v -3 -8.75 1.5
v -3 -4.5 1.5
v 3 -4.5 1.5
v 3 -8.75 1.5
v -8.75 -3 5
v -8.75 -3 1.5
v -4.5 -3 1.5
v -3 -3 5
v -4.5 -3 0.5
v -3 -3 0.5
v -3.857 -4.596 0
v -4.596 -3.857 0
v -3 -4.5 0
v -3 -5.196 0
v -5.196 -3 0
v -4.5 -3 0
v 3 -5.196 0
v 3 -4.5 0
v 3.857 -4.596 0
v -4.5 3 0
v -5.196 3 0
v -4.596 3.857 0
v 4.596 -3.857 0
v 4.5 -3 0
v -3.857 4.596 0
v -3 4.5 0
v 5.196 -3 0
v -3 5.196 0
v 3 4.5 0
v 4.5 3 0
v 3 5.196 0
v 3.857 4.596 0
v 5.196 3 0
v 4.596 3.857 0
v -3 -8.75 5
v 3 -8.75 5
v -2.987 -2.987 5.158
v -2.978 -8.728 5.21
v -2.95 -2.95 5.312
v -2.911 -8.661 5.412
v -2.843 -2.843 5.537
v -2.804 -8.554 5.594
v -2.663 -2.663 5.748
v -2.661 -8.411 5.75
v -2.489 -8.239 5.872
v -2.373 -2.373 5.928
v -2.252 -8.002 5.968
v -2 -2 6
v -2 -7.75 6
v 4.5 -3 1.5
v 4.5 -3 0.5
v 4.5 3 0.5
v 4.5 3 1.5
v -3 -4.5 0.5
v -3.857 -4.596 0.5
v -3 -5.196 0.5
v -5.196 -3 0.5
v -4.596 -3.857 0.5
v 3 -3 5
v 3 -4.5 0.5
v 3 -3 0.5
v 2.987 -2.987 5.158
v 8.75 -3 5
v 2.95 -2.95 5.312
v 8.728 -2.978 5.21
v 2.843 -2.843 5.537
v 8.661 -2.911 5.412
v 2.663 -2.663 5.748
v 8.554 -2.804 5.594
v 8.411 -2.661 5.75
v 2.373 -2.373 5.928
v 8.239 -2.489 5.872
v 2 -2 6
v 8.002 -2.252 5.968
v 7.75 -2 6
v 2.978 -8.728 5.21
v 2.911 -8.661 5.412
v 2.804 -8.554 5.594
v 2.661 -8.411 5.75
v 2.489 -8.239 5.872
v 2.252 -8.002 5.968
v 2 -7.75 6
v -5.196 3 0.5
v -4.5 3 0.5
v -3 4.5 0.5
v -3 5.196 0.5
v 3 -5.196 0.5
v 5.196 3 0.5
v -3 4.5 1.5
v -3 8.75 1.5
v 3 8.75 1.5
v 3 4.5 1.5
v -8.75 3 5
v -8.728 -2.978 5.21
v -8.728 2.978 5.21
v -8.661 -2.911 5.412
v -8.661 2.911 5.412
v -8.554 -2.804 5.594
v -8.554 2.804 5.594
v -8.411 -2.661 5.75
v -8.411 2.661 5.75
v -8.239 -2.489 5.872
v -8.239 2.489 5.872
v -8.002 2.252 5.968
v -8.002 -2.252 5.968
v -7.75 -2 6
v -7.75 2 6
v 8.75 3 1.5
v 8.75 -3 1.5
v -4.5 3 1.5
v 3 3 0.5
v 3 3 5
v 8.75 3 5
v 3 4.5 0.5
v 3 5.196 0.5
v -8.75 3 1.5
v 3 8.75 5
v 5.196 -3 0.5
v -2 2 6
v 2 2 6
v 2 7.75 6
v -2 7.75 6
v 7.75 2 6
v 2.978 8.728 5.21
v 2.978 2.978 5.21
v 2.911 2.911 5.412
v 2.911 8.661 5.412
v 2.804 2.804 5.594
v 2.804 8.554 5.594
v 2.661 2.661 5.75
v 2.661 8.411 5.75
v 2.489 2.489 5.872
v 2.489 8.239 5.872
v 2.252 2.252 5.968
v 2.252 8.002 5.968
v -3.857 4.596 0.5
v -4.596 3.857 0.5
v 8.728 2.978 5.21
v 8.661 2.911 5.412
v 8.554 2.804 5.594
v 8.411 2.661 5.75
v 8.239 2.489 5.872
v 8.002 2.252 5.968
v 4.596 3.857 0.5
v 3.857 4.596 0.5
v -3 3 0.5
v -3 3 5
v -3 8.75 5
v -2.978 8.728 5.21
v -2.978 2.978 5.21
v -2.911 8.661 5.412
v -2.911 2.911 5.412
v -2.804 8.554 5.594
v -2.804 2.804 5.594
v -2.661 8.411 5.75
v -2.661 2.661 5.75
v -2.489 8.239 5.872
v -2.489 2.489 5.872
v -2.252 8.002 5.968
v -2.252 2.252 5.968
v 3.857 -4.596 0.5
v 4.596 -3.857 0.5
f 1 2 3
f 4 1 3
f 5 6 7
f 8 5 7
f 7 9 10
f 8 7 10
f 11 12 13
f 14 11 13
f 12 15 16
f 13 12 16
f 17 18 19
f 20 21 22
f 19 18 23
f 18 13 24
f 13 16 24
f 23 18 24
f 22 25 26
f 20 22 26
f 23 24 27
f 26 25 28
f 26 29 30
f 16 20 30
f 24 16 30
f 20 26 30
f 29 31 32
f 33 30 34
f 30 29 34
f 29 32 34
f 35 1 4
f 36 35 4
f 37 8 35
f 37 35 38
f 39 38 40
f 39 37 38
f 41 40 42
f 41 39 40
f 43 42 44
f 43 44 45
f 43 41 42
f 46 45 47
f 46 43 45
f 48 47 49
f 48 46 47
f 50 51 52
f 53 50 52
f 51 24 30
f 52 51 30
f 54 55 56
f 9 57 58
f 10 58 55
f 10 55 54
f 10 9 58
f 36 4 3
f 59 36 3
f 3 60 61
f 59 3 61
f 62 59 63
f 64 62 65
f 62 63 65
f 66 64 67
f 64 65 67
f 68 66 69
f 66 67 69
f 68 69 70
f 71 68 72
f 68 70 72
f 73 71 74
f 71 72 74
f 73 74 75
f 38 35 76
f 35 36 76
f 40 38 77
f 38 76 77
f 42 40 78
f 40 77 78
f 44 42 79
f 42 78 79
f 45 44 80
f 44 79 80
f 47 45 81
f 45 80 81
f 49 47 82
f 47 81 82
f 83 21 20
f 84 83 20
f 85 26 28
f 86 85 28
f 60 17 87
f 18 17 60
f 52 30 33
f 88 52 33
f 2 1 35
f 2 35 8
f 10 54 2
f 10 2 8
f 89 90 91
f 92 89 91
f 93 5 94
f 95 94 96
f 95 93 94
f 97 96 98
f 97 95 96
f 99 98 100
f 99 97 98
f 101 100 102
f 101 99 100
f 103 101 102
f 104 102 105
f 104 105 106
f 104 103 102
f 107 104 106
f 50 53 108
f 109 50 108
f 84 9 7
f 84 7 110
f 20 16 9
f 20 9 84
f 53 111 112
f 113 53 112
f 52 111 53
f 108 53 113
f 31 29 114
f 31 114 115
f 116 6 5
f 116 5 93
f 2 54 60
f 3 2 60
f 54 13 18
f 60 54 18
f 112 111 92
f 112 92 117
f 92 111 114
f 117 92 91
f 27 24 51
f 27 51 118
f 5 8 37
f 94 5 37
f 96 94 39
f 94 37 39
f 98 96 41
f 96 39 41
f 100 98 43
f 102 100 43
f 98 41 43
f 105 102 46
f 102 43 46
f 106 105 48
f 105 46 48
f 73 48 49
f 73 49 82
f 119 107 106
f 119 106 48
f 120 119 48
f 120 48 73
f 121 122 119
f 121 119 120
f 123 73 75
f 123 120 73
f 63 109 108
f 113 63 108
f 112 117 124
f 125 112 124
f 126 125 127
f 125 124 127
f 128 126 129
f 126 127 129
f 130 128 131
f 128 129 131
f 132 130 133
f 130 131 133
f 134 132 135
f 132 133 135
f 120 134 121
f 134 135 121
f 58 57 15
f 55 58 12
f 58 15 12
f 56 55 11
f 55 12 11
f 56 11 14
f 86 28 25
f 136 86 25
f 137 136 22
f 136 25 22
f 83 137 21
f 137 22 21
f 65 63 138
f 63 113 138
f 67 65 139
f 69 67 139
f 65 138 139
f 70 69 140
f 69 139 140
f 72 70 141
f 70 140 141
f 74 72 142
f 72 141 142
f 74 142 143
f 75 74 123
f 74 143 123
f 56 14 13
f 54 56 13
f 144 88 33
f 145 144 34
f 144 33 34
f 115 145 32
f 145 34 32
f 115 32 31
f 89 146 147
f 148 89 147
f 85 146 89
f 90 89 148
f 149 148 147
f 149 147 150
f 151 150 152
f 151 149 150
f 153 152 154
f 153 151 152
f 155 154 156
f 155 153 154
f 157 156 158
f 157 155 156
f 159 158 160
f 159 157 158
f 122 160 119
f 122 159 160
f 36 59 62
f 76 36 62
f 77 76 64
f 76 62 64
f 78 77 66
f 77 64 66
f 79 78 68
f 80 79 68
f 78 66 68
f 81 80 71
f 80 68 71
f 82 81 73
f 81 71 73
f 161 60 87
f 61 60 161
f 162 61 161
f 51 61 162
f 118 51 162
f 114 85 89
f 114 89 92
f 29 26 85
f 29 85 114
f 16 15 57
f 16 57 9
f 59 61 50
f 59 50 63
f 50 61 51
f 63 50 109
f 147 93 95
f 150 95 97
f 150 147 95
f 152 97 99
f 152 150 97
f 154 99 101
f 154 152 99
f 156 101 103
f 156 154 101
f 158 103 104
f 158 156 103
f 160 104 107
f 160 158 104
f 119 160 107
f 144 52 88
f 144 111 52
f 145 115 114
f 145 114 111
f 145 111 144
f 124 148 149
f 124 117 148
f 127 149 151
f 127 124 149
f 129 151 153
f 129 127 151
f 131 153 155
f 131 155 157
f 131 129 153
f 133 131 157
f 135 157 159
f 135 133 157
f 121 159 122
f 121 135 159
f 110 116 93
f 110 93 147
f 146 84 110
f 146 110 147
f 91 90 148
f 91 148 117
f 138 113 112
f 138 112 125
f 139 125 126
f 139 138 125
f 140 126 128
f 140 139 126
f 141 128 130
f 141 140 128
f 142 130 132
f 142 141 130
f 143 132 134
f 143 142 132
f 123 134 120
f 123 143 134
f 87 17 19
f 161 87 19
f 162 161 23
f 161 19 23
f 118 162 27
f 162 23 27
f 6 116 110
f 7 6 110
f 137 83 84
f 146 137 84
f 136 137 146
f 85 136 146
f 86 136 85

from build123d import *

# Parameters (mm, degrees)
BOX008_W       = 10
BOX008_H       = 6
BOX008_DEPTH   = 1.5
BOX009_W       = 10
BOX009_H       = 6
BOX009_DEPTH   = 1.5
BOX010_W       = 6
BOX010_H       = 10
BOX010_DEPTH   = 1.5
BOX011_W       = 6
BOX011_H       = 10
BOX011_DEPTH   = 1.5
BOX007_W       = 6
BOX007_H       = 17.5
BOX007_DEPTH   = 6
FILLET_R       = 1
BOX006_W       = 17.5
BOX006_H       = 6
BOX006_DEPTH   = 6
FILLET001_R    = 1
CYLINDER_R     = 6
CYLINDER_DEPTH = 0.5


with BuildPart() as cube:
    # Box008 → Box008 (new body)
    with BuildSketch(Plane(origin=(4.5, -3, 0), x_dir=(1, 0, 0), z_dir=(0, 0, 1))):
        with Locations((5, 3)):
            Rectangle(BOX008_W, BOX008_H)
    extrude(amount=BOX008_DEPTH)


with BuildPart() as cube001:
    # Box009 → Box009 (new body)
    with BuildSketch(Plane(origin=(-14.5, -3, 0), x_dir=(1, 0, 0), z_dir=(0, 0, 1))):
        with Locations((5, 3)):
            Rectangle(BOX009_W, BOX009_H)
    extrude(amount=BOX009_DEPTH)


with BuildPart() as cube002:
    # Box010 → Box010 (new body)
    with BuildSketch(Plane(origin=(-3, 4.5, 0), x_dir=(1, 0, 0), z_dir=(0, 0, 1))):
        with Locations((3, 5)):
            Rectangle(BOX010_W, BOX010_H)
    extrude(amount=BOX010_DEPTH)


with BuildPart() as cube003:
    # Box011 → Box011 (new body)
    with BuildSketch(Plane(origin=(-3, -14.5, 0), x_dir=(1, 0, 0), z_dir=(0, 0, 1))):
        with Locations((3, 5)):
            Rectangle(BOX011_W, BOX011_H)
    extrude(amount=BOX011_DEPTH)


with BuildPart() as fillet_body:
    # Box007 → Box007 (new body)
    with BuildSketch(Plane(origin=(-3, -8.75, 0), x_dir=(1, 0, 0), z_dir=(0, 0, 1))):
        with Locations((3, 8.75)):
            Rectangle(BOX007_W, BOX007_H)
    extrude(amount=BOX007_DEPTH)

    # Fillet
    fillet_edges = [fillet_body.edges().sort_by_distance(p)[0] for p in [
        (-3, 0, 6),
        (3, 0, 6),
        (0, -8.75, 6),
        (0, 8.75, 6),
    ]]
    fillet(fillet_edges, radius=FILLET_R)


with BuildPart() as fusion:
    # Box006 → Box006 (new body)
    with BuildSketch(Plane(origin=(-8.75, -3, 0), x_dir=(1, 0, 0), z_dir=(0, 0, 1))):
        with Locations((8.75, 3)):
            Rectangle(BOX006_W, BOX006_H)
    extrude(amount=BOX006_DEPTH)

    # Fillet001
    fillet001_edges = [fusion.edges().sort_by_distance(p)[0] for p in [
        (-8.75, 0, 6),
        (8.75, 0, 6),
        (0, -3, 6),
        (0, 3, 6),
    ]]
    fillet(fillet001_edges, radius=FILLET001_R)

    # Fusion: union Fillet body
    add(fillet_body.part)


with BuildPart() as cut003:
    # Cylinder → Cylinder (new body)
    with BuildSketch(Plane.XY):
        Circle(CYLINDER_R)
    extrude(amount=CYLINDER_DEPTH)

    # Fusion001: union Fusion
    add(fusion.part)

    # Cut: cut Cube003
    add(cube003.part, mode=Mode.SUBTRACT)

    # Cut001: cut Cube002
    add(cube002.part, mode=Mode.SUBTRACT)

    # Cut002: cut Cube001
    add(cube001.part, mode=Mode.SUBTRACT)

    # Cut003: cut Cube
    add(cube.part, mode=Mode.SUBTRACT)


solid = cut003.part
